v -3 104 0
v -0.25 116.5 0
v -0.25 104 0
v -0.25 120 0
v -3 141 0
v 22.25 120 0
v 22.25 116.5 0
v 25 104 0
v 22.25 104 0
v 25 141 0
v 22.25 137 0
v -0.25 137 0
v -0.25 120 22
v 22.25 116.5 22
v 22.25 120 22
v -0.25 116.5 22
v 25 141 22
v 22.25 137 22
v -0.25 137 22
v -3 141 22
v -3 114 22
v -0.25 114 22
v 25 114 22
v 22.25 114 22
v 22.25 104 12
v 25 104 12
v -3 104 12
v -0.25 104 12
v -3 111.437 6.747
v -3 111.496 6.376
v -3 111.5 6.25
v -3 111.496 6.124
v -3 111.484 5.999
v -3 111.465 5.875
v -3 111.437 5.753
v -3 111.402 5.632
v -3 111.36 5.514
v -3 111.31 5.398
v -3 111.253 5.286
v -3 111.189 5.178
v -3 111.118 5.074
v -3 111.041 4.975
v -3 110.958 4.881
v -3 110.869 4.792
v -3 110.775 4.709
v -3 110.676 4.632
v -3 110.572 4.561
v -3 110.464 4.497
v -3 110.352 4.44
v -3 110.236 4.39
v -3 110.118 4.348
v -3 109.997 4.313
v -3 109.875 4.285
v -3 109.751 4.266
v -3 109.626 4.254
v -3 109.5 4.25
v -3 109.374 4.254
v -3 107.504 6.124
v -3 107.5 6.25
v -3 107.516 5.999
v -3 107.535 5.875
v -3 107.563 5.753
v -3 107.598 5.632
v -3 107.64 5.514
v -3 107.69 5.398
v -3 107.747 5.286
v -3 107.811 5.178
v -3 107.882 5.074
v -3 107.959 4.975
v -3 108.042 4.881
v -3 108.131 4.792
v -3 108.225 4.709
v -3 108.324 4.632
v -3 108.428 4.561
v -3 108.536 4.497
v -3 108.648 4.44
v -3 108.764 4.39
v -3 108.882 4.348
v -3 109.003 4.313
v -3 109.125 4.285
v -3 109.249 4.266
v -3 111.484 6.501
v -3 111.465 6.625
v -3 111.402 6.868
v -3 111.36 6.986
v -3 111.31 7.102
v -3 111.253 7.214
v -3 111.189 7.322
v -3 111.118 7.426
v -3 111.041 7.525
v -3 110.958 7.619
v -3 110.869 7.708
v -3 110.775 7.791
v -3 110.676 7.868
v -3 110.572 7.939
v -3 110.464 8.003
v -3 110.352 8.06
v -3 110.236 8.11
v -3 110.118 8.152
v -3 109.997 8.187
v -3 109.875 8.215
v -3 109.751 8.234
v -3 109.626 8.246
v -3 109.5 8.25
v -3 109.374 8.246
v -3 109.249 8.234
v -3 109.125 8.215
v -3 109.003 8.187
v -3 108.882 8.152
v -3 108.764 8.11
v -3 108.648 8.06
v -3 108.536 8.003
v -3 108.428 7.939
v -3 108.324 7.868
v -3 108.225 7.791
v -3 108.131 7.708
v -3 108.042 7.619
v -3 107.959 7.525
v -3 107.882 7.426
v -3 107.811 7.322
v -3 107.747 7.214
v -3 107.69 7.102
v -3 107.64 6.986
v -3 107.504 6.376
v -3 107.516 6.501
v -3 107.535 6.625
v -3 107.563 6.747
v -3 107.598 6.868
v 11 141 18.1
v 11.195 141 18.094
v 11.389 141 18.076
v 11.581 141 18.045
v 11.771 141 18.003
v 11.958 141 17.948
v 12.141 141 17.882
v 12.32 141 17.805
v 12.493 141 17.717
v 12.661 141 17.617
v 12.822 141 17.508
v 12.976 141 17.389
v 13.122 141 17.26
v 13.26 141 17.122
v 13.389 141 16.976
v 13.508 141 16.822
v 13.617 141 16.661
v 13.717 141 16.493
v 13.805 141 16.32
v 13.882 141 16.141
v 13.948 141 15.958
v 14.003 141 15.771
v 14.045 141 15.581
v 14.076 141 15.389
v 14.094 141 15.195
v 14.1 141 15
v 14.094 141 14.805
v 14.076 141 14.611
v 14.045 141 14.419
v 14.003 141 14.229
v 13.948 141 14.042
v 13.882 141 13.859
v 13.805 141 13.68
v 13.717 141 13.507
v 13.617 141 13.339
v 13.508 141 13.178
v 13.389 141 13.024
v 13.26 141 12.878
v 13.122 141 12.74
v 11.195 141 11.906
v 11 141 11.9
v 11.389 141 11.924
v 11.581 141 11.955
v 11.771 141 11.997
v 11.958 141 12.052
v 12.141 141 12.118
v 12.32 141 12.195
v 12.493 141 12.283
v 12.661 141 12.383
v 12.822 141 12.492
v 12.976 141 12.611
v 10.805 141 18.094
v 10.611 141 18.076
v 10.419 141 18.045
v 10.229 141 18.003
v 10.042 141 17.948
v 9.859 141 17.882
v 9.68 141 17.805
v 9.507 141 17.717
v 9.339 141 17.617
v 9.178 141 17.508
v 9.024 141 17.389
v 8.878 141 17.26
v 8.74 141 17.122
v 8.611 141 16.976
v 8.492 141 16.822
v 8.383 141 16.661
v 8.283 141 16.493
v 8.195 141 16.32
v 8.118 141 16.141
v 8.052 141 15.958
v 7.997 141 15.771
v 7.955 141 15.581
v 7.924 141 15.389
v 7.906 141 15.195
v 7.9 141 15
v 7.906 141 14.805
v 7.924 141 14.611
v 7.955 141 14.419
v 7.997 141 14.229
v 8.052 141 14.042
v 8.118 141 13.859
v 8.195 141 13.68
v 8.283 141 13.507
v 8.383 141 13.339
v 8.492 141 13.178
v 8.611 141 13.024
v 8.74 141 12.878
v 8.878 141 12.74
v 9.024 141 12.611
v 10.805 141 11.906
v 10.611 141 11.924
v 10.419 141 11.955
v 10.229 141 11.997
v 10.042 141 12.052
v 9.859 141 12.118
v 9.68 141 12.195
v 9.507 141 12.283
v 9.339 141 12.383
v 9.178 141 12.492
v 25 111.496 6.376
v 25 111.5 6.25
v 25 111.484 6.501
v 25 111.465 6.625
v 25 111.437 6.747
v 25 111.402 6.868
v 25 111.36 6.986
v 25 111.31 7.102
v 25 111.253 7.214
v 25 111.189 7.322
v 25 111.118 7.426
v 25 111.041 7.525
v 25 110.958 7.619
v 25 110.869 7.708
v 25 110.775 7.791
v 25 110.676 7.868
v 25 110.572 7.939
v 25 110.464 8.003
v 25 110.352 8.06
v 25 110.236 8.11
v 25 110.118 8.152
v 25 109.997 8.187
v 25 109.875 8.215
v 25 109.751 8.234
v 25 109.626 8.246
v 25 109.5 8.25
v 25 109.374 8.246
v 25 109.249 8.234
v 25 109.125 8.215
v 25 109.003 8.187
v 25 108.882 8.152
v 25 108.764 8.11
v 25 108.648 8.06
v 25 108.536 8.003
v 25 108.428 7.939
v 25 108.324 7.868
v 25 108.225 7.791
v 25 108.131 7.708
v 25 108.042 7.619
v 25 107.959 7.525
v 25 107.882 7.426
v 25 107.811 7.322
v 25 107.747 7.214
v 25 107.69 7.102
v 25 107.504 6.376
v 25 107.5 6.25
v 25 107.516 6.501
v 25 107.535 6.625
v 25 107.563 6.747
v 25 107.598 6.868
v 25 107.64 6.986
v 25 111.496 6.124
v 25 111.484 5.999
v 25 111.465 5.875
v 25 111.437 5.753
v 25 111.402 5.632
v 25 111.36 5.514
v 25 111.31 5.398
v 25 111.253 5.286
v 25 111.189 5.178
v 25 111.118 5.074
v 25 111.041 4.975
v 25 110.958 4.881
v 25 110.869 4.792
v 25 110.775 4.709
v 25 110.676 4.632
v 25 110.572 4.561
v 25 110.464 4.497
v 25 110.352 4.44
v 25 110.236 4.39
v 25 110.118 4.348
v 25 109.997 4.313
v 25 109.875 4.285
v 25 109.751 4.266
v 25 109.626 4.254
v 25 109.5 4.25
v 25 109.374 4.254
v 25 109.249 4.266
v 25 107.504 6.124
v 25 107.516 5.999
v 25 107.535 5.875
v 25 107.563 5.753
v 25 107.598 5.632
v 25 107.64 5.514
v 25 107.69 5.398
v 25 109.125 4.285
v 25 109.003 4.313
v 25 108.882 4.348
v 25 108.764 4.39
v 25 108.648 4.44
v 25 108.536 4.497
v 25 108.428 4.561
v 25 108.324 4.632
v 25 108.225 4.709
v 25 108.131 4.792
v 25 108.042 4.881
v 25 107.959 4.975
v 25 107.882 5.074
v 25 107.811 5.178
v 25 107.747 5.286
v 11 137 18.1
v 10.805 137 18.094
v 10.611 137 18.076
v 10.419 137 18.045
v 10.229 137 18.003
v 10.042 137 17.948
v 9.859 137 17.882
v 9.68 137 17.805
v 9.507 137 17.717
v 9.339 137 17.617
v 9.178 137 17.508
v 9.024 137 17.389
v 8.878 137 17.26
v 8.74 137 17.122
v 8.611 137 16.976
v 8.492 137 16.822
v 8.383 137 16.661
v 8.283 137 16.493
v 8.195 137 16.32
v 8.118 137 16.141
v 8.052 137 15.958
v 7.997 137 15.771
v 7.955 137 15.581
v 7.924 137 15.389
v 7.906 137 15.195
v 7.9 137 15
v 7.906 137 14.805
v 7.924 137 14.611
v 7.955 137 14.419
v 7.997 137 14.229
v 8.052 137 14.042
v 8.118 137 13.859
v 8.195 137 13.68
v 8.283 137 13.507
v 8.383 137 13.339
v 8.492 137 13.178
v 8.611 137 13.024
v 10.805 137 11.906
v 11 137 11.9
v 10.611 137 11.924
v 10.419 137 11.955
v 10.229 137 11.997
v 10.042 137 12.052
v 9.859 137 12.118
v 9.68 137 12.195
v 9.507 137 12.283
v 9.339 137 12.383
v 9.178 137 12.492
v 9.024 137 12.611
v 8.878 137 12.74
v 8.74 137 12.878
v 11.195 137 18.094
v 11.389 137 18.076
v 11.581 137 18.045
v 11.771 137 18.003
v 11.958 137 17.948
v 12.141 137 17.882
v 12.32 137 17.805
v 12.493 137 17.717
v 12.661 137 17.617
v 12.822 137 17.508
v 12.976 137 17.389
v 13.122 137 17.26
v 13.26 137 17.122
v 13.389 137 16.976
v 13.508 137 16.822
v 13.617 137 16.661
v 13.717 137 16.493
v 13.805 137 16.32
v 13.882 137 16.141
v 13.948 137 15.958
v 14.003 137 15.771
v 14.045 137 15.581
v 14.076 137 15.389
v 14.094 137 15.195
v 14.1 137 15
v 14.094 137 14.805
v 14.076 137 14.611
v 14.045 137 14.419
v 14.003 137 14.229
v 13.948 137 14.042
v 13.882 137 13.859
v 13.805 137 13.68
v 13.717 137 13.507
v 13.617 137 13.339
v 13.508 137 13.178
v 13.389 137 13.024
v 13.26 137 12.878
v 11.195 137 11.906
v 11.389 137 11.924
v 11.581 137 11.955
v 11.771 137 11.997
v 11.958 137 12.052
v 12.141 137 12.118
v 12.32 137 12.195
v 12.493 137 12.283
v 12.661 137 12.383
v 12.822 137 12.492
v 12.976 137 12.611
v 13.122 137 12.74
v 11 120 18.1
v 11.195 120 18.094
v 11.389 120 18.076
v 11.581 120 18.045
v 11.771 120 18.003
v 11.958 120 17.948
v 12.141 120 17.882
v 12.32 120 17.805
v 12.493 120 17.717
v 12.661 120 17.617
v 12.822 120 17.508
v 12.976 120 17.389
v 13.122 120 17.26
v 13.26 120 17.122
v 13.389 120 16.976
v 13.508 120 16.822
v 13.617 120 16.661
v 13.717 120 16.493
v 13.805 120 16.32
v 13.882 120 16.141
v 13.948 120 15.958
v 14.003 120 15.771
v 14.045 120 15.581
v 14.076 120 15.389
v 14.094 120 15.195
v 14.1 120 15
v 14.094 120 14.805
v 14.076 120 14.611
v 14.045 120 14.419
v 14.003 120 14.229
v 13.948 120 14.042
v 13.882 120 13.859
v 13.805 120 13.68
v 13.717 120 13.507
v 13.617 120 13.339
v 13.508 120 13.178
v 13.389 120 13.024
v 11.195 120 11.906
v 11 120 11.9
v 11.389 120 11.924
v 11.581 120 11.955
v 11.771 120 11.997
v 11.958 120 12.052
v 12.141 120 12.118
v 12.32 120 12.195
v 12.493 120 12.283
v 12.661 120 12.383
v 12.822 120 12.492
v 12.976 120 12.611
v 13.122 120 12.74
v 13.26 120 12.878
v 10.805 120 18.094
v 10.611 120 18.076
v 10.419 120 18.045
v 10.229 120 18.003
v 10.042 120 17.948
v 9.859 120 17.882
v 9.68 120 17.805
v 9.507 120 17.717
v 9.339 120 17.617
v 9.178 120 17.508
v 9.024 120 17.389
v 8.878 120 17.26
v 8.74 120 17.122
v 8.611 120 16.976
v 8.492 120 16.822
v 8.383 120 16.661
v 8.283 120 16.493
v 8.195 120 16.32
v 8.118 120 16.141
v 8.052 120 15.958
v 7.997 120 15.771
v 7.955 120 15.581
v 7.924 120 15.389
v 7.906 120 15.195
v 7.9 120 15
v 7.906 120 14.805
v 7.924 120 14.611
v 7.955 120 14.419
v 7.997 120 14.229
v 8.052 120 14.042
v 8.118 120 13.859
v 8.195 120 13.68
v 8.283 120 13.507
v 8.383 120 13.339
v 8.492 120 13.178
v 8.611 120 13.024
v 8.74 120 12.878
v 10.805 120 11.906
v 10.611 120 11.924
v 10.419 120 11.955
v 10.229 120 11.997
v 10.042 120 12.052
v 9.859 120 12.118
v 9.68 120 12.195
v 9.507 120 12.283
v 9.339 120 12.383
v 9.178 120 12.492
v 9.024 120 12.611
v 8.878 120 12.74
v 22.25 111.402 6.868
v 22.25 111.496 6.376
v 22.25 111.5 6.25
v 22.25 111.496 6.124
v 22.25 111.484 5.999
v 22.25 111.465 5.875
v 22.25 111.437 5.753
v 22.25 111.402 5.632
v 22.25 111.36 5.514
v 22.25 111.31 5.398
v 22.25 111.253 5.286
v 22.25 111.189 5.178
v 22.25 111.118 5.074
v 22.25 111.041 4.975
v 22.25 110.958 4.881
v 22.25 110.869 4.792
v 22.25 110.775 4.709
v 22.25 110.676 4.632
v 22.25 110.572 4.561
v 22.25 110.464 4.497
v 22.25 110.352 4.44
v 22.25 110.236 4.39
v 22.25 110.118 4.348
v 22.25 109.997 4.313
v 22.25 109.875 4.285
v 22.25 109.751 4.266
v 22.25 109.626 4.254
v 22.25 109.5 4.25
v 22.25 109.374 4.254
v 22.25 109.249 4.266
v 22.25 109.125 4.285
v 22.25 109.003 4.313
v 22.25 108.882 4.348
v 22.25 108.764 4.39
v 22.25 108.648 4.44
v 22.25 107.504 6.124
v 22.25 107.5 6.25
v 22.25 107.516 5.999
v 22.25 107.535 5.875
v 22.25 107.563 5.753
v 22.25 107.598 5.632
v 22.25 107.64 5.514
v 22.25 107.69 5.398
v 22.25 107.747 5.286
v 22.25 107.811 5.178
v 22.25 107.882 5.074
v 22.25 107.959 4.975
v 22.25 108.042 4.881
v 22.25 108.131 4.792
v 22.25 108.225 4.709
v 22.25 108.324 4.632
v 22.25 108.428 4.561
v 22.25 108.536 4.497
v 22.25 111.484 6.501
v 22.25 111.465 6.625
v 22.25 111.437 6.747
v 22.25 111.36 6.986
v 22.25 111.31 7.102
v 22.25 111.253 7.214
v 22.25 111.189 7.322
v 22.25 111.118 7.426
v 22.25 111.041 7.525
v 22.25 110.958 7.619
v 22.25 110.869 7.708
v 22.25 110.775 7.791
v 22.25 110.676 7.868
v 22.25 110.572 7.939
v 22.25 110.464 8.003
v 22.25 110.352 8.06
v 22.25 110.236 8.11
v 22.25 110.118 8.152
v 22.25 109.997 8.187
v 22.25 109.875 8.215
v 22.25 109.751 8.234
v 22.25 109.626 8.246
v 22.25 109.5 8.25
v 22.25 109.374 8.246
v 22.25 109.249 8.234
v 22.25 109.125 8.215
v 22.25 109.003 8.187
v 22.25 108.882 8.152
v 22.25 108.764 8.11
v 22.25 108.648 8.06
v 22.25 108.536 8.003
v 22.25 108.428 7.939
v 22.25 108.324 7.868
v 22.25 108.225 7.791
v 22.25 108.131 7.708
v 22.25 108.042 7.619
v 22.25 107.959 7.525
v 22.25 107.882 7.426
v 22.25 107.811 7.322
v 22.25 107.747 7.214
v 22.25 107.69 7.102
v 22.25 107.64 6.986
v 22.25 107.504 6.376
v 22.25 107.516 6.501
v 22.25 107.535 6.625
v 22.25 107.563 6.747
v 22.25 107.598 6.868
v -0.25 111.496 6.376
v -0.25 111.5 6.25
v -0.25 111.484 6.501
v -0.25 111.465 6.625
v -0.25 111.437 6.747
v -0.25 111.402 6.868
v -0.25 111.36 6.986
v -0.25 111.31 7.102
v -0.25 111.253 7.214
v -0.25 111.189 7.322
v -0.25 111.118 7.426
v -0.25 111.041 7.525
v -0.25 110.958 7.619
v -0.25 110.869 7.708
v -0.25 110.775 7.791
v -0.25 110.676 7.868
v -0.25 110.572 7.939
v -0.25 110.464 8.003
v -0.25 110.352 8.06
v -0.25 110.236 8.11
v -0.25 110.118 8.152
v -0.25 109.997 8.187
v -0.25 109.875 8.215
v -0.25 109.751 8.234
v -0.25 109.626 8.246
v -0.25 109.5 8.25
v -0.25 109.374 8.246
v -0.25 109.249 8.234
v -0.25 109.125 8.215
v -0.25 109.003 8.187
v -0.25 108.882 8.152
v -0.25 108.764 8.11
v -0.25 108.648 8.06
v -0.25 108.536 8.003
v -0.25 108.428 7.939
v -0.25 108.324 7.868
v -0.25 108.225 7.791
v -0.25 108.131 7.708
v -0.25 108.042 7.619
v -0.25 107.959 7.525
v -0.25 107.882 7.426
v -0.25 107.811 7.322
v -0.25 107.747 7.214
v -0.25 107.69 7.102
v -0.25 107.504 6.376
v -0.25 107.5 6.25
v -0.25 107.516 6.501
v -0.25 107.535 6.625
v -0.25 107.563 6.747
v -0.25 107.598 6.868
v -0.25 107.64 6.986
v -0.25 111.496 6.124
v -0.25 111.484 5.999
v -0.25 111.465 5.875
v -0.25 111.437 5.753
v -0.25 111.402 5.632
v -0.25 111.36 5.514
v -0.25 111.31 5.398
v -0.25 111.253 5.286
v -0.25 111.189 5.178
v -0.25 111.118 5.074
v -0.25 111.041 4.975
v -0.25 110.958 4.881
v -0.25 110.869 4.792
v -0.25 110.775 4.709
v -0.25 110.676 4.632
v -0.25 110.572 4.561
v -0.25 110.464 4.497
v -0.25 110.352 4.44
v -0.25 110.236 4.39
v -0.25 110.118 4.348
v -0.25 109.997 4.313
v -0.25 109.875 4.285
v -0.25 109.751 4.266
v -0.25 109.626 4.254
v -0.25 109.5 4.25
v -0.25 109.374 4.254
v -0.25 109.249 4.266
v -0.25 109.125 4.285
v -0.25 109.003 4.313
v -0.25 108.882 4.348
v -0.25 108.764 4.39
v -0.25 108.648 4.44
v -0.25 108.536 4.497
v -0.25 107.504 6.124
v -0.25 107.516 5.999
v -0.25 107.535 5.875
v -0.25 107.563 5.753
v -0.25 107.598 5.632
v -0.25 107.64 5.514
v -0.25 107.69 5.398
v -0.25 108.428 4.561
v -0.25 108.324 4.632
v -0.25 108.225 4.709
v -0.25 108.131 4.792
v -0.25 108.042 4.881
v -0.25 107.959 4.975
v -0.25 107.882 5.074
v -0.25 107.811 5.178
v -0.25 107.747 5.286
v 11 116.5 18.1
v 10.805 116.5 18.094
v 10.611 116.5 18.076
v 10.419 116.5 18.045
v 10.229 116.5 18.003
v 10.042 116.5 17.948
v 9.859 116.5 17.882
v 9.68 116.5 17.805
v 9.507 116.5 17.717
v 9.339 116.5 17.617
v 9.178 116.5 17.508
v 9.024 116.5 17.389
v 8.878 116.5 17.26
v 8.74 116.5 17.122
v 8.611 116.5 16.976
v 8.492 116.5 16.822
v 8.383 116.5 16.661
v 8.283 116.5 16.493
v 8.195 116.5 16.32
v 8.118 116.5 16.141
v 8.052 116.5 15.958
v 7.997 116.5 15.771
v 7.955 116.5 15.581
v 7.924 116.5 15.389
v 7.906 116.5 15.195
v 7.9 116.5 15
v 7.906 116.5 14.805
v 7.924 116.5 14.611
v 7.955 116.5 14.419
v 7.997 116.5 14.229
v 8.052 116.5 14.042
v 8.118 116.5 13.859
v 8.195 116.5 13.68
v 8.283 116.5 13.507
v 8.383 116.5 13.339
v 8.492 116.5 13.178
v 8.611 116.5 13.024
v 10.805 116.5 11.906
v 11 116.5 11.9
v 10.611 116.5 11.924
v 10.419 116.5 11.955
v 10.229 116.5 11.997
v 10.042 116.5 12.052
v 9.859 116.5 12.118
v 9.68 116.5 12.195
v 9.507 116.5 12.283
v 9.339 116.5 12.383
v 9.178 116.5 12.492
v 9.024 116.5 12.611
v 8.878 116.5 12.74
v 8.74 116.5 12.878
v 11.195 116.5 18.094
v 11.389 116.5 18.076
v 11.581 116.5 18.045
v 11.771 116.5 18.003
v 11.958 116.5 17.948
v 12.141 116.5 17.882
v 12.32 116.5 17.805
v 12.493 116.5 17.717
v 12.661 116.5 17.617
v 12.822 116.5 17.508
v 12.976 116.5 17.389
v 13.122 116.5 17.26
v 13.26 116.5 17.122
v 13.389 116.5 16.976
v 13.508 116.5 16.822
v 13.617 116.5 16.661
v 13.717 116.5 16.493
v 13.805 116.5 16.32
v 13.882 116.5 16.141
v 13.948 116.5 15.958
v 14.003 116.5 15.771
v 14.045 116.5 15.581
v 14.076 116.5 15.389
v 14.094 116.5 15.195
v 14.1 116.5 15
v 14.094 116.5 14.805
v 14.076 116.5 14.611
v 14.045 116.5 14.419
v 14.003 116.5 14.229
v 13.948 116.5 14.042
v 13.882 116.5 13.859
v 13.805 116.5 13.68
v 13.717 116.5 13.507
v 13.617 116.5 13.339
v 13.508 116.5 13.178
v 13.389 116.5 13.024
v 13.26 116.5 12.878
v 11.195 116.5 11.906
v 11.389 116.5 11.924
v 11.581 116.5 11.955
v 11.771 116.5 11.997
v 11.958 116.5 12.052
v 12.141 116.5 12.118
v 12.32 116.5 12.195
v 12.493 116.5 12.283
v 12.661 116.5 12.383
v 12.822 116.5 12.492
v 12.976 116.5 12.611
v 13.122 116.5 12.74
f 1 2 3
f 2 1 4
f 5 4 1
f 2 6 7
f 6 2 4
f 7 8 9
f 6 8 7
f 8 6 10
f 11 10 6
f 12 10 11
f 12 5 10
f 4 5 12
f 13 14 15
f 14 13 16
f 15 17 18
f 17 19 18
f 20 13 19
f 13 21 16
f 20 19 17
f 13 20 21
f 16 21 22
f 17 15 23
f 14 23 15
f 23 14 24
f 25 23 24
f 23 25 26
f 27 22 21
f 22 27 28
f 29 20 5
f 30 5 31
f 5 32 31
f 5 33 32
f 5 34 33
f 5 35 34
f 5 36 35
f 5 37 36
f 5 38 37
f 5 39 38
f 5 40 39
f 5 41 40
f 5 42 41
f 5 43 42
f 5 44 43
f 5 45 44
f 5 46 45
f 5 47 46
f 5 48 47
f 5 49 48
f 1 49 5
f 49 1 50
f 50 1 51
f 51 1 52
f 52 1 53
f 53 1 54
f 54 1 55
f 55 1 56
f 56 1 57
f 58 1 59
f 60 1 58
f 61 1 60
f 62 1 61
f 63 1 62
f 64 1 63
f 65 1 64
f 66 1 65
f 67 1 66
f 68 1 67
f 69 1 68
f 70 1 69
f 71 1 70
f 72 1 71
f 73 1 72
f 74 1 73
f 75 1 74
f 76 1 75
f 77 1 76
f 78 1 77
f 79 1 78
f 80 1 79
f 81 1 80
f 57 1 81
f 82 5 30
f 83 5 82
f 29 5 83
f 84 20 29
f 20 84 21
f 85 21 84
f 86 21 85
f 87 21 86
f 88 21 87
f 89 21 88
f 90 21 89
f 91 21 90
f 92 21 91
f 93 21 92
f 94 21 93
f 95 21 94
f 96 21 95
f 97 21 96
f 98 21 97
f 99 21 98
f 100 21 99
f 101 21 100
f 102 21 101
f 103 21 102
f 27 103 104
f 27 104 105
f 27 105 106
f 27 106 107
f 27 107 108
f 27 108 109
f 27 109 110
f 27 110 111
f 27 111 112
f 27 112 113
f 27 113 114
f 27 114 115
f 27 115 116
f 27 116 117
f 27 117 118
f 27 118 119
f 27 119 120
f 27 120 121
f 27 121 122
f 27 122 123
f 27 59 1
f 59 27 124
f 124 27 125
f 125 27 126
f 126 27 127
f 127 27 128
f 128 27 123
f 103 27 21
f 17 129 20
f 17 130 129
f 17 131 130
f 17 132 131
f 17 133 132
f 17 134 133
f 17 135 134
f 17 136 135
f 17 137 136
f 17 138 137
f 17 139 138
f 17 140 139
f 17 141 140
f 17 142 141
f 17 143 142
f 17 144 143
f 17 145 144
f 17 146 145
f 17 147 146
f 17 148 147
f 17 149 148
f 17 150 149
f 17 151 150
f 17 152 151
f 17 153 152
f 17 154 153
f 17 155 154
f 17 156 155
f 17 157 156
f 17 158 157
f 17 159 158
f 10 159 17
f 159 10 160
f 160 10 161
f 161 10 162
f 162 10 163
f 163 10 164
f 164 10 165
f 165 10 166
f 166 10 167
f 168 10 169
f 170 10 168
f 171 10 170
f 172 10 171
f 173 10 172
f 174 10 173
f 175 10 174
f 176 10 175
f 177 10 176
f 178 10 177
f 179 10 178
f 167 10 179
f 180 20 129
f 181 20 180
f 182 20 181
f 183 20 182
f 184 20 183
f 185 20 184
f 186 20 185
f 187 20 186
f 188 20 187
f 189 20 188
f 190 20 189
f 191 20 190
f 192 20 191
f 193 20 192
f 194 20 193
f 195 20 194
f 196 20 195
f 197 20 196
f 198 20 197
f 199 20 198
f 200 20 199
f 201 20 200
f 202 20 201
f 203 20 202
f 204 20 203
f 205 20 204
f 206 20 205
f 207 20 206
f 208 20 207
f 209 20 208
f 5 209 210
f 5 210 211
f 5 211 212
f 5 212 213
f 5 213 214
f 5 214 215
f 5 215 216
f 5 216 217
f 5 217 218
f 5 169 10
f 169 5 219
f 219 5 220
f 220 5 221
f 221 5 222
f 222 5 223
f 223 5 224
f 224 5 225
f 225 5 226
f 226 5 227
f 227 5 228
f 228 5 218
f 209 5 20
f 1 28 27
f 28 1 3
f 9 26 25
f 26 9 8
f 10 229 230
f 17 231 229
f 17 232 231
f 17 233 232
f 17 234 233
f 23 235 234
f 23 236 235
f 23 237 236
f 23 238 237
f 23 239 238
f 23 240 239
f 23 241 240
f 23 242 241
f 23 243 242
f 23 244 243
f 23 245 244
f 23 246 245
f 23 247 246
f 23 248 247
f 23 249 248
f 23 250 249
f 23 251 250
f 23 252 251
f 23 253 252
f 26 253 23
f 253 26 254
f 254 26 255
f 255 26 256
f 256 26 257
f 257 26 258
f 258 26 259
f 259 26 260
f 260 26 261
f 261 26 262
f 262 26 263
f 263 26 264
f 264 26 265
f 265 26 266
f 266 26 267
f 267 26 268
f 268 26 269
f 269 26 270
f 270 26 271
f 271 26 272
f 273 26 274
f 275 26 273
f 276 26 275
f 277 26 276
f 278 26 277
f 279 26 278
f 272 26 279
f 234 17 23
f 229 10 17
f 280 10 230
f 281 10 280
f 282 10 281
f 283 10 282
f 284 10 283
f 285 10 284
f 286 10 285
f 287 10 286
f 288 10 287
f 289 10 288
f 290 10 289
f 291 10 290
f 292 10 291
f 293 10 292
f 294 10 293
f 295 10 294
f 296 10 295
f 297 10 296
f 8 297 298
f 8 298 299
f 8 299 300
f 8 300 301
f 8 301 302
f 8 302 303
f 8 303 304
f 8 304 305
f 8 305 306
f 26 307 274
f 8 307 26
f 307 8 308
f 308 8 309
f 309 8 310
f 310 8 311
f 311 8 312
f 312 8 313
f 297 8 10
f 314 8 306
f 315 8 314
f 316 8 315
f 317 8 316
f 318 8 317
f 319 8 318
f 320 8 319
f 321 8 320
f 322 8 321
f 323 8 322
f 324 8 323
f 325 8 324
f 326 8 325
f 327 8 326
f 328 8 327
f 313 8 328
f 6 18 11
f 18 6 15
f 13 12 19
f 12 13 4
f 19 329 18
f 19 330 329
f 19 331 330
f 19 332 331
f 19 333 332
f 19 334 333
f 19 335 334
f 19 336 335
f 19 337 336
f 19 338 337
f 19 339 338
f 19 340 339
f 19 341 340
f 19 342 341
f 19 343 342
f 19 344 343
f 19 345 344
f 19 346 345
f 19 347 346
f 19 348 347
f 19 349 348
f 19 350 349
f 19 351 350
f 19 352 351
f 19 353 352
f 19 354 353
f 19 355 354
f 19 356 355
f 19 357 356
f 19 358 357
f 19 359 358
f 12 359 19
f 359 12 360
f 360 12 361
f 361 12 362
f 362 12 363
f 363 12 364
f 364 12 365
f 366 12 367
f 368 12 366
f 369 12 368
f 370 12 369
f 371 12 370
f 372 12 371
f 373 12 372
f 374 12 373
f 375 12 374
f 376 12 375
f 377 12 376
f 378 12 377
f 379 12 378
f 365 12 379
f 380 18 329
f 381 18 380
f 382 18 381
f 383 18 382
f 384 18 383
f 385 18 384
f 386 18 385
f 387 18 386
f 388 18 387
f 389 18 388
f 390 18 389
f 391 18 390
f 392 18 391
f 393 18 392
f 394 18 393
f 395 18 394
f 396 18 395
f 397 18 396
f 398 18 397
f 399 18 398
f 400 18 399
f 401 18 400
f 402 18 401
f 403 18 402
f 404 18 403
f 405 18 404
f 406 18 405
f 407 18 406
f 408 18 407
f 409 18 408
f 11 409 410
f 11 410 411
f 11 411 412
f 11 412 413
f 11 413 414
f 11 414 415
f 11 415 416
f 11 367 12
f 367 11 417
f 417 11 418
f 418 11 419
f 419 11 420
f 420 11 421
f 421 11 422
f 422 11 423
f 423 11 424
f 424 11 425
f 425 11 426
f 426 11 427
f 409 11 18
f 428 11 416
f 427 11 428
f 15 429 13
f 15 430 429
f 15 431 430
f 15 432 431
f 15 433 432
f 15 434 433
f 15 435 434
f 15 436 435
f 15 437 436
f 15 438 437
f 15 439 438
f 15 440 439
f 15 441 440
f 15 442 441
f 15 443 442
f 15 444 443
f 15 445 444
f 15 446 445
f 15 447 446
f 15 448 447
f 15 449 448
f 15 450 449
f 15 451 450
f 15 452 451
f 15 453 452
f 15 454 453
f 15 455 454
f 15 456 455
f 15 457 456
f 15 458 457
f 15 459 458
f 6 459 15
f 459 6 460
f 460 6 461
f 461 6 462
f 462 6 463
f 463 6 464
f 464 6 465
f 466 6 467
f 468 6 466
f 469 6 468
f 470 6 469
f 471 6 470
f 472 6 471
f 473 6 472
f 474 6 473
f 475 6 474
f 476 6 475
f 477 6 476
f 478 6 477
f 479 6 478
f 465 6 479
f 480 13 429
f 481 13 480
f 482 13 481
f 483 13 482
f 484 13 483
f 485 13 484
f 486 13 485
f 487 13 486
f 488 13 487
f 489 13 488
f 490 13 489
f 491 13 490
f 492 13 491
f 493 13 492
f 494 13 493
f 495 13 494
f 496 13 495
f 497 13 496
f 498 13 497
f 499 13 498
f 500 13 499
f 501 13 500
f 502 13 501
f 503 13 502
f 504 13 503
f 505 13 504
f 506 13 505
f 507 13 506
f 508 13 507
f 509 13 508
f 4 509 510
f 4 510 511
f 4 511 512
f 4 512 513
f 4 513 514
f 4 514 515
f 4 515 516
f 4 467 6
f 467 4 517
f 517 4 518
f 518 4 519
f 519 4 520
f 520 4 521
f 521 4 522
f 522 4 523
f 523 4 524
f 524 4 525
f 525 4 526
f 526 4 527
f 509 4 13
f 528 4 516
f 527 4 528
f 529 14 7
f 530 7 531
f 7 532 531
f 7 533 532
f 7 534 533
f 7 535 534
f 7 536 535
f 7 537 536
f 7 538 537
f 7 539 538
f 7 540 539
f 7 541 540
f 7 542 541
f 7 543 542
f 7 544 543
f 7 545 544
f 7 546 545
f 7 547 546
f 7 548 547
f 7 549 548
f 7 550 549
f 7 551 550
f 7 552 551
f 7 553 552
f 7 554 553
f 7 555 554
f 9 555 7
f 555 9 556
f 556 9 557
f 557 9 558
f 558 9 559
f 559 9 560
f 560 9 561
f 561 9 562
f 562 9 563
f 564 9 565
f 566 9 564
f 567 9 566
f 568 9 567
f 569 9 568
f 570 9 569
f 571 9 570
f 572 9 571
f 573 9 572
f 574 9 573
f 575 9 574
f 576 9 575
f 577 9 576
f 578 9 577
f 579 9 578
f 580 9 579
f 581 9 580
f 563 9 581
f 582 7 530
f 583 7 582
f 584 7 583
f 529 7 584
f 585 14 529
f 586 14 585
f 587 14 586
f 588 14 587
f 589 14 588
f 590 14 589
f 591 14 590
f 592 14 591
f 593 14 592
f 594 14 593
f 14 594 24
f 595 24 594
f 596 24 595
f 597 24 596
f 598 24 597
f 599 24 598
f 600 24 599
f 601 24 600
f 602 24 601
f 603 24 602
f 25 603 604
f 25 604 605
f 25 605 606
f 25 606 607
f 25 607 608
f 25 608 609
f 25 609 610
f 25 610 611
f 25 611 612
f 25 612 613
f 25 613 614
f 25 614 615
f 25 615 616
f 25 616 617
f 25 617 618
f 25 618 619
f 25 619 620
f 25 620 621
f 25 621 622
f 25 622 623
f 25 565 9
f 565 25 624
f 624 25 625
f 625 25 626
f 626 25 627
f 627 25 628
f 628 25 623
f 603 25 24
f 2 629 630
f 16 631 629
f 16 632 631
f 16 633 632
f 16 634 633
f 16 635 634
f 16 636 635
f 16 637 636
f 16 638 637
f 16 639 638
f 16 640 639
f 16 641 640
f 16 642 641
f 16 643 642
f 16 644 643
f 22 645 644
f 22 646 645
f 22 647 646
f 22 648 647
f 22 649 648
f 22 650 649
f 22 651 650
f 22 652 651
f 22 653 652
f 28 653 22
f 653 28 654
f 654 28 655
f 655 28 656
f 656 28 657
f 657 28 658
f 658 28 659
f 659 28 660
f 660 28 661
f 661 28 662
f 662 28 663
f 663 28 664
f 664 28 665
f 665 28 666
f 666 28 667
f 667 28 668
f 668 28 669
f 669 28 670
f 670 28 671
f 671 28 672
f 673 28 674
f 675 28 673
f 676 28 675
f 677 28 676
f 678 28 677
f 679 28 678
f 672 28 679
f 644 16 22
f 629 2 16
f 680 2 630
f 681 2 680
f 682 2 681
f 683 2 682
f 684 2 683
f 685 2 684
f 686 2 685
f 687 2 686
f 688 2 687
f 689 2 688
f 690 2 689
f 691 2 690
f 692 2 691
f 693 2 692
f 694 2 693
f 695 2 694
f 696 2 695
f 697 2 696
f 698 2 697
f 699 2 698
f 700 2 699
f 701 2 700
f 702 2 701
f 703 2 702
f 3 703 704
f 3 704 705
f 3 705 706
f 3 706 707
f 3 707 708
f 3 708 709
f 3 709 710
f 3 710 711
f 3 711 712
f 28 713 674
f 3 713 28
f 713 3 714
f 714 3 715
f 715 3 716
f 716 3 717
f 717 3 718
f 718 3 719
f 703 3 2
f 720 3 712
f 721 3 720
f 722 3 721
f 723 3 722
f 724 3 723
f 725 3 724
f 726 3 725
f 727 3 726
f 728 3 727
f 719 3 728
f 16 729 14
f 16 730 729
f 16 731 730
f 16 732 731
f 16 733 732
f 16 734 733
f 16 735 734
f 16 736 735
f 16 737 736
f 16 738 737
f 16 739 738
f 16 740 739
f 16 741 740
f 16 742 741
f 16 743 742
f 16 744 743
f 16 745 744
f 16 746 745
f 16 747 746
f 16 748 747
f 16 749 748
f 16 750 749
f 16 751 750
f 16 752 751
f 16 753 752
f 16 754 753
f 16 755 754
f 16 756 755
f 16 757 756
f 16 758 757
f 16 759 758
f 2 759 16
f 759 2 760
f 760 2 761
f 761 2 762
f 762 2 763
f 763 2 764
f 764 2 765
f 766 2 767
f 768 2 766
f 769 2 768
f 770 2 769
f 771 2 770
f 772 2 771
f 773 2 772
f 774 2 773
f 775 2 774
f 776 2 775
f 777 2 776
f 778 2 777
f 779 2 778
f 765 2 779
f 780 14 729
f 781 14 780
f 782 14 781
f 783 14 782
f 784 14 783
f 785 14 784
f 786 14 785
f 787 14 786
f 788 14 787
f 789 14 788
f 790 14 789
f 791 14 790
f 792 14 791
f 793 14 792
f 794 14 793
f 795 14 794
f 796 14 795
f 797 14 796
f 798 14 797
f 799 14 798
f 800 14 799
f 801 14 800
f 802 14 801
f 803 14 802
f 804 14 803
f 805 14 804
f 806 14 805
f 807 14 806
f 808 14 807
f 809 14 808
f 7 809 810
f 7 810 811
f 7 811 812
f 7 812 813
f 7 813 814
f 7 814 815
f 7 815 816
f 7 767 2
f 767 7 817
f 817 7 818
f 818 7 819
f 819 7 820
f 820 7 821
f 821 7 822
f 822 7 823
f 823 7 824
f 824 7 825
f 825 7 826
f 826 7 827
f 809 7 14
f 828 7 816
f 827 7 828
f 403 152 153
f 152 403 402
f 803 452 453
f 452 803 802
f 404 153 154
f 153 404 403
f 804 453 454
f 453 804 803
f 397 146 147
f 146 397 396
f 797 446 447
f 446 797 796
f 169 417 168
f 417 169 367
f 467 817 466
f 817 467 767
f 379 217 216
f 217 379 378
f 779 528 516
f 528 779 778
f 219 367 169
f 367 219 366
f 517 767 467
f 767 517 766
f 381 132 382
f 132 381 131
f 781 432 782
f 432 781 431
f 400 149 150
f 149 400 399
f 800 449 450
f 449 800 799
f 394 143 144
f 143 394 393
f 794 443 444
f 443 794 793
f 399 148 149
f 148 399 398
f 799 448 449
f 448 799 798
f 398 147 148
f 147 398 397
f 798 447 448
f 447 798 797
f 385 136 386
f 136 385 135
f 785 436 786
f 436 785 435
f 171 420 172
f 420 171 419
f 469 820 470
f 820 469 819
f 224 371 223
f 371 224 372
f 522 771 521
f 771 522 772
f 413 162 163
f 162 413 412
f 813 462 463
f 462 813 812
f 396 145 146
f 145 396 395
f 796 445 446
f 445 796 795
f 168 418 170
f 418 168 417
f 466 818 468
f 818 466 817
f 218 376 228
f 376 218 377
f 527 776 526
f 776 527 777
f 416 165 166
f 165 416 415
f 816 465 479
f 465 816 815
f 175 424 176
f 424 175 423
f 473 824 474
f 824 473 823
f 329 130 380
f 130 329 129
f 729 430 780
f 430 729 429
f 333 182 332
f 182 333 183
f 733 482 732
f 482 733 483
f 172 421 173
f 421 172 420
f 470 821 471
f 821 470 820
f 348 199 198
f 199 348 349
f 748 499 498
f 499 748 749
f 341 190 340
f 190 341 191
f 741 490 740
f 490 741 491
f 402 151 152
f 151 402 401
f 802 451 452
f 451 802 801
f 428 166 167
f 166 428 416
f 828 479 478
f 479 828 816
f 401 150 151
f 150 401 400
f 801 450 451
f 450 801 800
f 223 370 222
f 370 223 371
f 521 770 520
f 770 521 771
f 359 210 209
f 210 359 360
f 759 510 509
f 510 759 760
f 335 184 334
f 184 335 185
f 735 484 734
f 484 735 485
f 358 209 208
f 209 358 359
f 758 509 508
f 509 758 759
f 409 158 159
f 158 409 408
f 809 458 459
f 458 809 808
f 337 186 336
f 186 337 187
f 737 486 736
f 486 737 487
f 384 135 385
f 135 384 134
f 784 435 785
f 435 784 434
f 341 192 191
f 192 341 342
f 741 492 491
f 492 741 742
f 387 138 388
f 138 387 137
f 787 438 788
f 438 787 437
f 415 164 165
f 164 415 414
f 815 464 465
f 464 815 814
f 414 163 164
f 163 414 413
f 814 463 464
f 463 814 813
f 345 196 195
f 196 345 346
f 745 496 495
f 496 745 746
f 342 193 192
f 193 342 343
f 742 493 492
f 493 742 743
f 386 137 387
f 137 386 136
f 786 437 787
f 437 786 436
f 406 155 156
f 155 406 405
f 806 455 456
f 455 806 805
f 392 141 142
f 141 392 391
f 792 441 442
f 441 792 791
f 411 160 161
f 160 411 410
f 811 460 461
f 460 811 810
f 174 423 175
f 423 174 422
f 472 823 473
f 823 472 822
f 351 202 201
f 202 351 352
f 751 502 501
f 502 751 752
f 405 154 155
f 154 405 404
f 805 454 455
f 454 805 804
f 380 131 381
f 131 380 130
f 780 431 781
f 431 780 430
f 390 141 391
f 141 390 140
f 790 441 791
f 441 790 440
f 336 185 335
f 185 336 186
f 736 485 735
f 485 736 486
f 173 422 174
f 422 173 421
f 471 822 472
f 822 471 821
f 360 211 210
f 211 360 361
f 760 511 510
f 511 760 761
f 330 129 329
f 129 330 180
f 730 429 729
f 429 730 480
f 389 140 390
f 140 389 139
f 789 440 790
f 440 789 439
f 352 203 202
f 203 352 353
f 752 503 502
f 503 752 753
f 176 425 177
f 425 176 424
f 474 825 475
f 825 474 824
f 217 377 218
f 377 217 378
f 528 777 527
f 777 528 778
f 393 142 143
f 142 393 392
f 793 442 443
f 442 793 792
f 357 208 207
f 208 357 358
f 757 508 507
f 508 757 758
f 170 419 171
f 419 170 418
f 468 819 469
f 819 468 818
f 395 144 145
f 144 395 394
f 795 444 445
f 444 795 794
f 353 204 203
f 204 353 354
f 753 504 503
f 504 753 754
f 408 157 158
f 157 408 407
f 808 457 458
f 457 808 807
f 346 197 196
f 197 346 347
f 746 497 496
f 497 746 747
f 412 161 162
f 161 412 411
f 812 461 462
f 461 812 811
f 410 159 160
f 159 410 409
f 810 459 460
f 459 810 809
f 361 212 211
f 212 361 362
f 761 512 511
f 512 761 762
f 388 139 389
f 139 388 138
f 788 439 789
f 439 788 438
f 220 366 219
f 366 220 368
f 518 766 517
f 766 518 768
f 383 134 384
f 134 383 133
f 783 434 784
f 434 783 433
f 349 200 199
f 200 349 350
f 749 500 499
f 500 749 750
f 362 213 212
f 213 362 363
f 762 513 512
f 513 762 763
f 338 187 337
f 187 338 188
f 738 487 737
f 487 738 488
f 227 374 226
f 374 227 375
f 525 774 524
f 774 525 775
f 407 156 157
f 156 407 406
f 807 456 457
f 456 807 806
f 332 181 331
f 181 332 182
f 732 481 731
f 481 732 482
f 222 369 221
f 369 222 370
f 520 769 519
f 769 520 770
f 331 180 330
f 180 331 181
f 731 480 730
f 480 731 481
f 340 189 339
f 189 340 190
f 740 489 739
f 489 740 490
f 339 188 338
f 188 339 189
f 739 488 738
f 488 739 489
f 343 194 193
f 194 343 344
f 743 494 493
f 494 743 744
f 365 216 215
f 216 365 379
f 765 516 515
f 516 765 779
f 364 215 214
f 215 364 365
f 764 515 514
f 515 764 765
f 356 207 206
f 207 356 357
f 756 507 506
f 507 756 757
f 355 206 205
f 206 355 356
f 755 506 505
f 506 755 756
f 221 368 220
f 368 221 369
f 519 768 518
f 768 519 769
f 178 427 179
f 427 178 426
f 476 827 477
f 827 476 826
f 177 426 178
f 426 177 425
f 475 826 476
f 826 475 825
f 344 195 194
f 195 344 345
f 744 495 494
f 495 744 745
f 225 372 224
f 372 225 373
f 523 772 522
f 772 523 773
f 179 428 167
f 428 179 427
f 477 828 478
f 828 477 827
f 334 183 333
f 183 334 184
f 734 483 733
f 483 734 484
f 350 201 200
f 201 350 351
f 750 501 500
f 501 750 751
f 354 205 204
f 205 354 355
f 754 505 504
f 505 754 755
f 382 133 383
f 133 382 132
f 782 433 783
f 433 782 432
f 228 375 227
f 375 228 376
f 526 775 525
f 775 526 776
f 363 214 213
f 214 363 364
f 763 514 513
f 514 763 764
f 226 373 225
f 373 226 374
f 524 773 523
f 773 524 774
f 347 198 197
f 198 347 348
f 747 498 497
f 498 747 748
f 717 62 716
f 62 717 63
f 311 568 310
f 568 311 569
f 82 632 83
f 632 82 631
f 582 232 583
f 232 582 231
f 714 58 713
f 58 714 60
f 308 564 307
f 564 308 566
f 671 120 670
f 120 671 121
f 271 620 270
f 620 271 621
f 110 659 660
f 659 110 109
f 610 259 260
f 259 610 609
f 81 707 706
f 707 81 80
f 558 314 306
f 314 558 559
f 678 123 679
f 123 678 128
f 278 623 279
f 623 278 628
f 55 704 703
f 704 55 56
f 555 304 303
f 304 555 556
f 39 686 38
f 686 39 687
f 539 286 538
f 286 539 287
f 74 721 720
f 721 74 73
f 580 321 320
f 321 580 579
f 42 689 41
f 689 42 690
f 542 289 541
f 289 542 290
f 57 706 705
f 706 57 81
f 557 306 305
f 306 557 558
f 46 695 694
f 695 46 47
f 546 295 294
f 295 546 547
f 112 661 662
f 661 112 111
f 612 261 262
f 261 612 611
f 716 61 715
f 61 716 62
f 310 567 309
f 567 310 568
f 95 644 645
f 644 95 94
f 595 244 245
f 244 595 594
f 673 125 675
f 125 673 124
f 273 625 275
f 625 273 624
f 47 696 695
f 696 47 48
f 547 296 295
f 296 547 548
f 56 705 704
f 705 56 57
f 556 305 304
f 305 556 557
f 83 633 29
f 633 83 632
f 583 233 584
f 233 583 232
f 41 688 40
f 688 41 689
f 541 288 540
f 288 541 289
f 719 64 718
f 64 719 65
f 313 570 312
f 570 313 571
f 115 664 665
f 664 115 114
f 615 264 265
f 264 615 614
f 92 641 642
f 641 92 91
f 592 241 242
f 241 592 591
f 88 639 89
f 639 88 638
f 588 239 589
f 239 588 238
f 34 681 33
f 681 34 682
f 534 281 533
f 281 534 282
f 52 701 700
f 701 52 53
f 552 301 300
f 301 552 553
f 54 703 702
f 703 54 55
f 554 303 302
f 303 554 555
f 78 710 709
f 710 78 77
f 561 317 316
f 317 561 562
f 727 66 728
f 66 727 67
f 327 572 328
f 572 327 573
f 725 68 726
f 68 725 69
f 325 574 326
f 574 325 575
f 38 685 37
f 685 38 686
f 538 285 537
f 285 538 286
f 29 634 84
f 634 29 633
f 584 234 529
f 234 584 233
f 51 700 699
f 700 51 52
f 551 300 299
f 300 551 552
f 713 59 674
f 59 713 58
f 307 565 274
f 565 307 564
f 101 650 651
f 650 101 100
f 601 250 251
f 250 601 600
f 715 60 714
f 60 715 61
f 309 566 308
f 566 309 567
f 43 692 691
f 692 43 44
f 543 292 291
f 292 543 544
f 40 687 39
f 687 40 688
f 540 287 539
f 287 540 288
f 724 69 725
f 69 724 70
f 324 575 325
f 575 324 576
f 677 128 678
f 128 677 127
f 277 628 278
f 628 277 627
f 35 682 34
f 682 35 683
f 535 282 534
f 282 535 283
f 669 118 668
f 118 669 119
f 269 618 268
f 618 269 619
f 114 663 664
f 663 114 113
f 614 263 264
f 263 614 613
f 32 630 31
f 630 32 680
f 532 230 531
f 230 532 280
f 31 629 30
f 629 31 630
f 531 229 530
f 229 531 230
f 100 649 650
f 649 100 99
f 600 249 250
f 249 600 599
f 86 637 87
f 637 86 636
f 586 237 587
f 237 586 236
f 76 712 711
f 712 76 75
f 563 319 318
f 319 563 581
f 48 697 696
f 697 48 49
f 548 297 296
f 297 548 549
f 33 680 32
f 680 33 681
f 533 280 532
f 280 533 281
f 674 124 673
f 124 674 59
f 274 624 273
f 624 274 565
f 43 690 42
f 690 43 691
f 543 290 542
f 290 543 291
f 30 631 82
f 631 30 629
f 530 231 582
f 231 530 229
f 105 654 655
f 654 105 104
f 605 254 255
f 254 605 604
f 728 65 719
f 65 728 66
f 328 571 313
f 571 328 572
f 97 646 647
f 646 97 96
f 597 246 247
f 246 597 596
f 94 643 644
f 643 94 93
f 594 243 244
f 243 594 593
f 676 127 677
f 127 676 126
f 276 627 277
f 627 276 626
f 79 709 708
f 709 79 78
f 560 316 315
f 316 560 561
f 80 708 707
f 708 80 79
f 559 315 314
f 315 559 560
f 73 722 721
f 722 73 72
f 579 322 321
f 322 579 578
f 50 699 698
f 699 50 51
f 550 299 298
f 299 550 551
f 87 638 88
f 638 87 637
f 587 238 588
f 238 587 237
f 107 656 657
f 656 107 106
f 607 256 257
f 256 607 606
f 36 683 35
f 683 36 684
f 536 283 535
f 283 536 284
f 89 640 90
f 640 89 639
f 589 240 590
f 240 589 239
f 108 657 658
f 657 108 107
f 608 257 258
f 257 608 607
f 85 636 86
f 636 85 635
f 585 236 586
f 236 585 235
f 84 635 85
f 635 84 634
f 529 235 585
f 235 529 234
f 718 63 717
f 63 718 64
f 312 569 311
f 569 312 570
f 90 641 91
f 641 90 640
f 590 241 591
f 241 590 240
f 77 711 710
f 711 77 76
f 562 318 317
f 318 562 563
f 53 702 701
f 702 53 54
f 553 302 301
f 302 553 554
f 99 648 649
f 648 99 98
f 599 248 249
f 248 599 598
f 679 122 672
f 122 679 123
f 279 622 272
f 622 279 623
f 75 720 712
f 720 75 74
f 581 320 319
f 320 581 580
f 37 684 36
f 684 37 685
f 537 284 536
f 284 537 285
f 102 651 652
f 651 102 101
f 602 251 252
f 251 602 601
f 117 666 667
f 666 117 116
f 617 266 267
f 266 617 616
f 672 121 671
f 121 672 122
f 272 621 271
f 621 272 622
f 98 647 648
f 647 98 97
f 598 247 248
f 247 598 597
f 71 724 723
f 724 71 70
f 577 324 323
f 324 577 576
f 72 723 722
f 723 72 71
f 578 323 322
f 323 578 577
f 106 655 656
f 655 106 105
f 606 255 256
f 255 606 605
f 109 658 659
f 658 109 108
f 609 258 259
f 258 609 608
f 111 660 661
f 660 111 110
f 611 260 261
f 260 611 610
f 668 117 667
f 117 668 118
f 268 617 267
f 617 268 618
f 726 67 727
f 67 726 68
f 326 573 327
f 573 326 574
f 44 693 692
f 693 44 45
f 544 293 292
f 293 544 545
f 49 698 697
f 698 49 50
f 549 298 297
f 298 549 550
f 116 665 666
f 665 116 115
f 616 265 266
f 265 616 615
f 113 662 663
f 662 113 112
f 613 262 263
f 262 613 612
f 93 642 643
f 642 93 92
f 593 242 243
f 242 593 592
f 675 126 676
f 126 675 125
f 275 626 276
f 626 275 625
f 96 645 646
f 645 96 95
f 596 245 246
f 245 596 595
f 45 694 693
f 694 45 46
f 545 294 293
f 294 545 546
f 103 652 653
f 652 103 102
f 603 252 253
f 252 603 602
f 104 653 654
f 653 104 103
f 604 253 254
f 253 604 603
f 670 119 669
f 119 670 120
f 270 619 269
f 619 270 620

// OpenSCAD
$fn=100;

thickness=4;
thicknessPlate=4.5;

width=22;
lenthPartUnderBed=50;

lenthPart2=65;

high=thickness*2+thicknessPlate;

screwDiam=4;
/*
// part #1 : fix under bed
difference() {    
    hull() {
        cube([width,lenthPartUnderBed,high]);
        translate([0,lenthPartUnderBed,high/2]) rotate([0,90,0]) cylinder(d=high, h=width);
    }
    translate([0,-5,thickness]) cube([width,35,thickness]);
    translate([width/2,15,0]) cylinder(d=5.5,h=40);
    translate([width/2,15,thickness+thicknessPlate/2]) cylinder(d=8.5,h=40);
    translate([0,lenthPartUnderBed,high/2]) rotate([0,90,0]) cylinder(d=screwDiam, h=width);
}

// part #2 : arm onto fix under bed
translate([0,lenthPartUnderBed-5.5,0])
difference() {
    union() {
        hull() {
            translate([-3,0,0]) cube([width+3*2,20,high]);
            translate([0,15,0]) cube([width,20,high]);
        }
        hull() {
            translate([0,high/2,high/2]) rotate([0,90,0]) cylinder(d=high, h=width);
            translate([0,lenthPart2,high/2]) rotate([0,90,0]) cylinder(d=high, h=width);
        }
    }
    translate([-0.5/2,0,-1.5]) cube([width+0.5,12,10+6]);
    translate([-20,5.5,high/2]) rotate([0,90,0]) cylinder(d=screwDiam, h=50);
    translate([0,lenthPart2,high/2]) rotate([0,90,0]) cylinder(d=screwDiam, h=width);
}
*/
// part #3 : gopro fix
translate([0,104,0])
difference() {
    hull() {
        translate([-3,10,0]) cube([width+3*2,27,22]);
        translate([-3,0,0]) cube([width+3*2,37,12]);
    }
    translate([-0.5/2,thickness+12,0]) cube([width+0.5,35-2*thickness-10,25]);
    translate([-0.5/2,thickness-9,0]) cube([width+0.5,35-2*thickness-9.5,25]);
    translate([width/2,50,22-7]) rotate([90,0,0]) cylinder(d=6.2,h=50);
    translate([-20,5.5,high/2]) rotate([0,90,0]) cylinder(d=screwDiam, h=50);
}
